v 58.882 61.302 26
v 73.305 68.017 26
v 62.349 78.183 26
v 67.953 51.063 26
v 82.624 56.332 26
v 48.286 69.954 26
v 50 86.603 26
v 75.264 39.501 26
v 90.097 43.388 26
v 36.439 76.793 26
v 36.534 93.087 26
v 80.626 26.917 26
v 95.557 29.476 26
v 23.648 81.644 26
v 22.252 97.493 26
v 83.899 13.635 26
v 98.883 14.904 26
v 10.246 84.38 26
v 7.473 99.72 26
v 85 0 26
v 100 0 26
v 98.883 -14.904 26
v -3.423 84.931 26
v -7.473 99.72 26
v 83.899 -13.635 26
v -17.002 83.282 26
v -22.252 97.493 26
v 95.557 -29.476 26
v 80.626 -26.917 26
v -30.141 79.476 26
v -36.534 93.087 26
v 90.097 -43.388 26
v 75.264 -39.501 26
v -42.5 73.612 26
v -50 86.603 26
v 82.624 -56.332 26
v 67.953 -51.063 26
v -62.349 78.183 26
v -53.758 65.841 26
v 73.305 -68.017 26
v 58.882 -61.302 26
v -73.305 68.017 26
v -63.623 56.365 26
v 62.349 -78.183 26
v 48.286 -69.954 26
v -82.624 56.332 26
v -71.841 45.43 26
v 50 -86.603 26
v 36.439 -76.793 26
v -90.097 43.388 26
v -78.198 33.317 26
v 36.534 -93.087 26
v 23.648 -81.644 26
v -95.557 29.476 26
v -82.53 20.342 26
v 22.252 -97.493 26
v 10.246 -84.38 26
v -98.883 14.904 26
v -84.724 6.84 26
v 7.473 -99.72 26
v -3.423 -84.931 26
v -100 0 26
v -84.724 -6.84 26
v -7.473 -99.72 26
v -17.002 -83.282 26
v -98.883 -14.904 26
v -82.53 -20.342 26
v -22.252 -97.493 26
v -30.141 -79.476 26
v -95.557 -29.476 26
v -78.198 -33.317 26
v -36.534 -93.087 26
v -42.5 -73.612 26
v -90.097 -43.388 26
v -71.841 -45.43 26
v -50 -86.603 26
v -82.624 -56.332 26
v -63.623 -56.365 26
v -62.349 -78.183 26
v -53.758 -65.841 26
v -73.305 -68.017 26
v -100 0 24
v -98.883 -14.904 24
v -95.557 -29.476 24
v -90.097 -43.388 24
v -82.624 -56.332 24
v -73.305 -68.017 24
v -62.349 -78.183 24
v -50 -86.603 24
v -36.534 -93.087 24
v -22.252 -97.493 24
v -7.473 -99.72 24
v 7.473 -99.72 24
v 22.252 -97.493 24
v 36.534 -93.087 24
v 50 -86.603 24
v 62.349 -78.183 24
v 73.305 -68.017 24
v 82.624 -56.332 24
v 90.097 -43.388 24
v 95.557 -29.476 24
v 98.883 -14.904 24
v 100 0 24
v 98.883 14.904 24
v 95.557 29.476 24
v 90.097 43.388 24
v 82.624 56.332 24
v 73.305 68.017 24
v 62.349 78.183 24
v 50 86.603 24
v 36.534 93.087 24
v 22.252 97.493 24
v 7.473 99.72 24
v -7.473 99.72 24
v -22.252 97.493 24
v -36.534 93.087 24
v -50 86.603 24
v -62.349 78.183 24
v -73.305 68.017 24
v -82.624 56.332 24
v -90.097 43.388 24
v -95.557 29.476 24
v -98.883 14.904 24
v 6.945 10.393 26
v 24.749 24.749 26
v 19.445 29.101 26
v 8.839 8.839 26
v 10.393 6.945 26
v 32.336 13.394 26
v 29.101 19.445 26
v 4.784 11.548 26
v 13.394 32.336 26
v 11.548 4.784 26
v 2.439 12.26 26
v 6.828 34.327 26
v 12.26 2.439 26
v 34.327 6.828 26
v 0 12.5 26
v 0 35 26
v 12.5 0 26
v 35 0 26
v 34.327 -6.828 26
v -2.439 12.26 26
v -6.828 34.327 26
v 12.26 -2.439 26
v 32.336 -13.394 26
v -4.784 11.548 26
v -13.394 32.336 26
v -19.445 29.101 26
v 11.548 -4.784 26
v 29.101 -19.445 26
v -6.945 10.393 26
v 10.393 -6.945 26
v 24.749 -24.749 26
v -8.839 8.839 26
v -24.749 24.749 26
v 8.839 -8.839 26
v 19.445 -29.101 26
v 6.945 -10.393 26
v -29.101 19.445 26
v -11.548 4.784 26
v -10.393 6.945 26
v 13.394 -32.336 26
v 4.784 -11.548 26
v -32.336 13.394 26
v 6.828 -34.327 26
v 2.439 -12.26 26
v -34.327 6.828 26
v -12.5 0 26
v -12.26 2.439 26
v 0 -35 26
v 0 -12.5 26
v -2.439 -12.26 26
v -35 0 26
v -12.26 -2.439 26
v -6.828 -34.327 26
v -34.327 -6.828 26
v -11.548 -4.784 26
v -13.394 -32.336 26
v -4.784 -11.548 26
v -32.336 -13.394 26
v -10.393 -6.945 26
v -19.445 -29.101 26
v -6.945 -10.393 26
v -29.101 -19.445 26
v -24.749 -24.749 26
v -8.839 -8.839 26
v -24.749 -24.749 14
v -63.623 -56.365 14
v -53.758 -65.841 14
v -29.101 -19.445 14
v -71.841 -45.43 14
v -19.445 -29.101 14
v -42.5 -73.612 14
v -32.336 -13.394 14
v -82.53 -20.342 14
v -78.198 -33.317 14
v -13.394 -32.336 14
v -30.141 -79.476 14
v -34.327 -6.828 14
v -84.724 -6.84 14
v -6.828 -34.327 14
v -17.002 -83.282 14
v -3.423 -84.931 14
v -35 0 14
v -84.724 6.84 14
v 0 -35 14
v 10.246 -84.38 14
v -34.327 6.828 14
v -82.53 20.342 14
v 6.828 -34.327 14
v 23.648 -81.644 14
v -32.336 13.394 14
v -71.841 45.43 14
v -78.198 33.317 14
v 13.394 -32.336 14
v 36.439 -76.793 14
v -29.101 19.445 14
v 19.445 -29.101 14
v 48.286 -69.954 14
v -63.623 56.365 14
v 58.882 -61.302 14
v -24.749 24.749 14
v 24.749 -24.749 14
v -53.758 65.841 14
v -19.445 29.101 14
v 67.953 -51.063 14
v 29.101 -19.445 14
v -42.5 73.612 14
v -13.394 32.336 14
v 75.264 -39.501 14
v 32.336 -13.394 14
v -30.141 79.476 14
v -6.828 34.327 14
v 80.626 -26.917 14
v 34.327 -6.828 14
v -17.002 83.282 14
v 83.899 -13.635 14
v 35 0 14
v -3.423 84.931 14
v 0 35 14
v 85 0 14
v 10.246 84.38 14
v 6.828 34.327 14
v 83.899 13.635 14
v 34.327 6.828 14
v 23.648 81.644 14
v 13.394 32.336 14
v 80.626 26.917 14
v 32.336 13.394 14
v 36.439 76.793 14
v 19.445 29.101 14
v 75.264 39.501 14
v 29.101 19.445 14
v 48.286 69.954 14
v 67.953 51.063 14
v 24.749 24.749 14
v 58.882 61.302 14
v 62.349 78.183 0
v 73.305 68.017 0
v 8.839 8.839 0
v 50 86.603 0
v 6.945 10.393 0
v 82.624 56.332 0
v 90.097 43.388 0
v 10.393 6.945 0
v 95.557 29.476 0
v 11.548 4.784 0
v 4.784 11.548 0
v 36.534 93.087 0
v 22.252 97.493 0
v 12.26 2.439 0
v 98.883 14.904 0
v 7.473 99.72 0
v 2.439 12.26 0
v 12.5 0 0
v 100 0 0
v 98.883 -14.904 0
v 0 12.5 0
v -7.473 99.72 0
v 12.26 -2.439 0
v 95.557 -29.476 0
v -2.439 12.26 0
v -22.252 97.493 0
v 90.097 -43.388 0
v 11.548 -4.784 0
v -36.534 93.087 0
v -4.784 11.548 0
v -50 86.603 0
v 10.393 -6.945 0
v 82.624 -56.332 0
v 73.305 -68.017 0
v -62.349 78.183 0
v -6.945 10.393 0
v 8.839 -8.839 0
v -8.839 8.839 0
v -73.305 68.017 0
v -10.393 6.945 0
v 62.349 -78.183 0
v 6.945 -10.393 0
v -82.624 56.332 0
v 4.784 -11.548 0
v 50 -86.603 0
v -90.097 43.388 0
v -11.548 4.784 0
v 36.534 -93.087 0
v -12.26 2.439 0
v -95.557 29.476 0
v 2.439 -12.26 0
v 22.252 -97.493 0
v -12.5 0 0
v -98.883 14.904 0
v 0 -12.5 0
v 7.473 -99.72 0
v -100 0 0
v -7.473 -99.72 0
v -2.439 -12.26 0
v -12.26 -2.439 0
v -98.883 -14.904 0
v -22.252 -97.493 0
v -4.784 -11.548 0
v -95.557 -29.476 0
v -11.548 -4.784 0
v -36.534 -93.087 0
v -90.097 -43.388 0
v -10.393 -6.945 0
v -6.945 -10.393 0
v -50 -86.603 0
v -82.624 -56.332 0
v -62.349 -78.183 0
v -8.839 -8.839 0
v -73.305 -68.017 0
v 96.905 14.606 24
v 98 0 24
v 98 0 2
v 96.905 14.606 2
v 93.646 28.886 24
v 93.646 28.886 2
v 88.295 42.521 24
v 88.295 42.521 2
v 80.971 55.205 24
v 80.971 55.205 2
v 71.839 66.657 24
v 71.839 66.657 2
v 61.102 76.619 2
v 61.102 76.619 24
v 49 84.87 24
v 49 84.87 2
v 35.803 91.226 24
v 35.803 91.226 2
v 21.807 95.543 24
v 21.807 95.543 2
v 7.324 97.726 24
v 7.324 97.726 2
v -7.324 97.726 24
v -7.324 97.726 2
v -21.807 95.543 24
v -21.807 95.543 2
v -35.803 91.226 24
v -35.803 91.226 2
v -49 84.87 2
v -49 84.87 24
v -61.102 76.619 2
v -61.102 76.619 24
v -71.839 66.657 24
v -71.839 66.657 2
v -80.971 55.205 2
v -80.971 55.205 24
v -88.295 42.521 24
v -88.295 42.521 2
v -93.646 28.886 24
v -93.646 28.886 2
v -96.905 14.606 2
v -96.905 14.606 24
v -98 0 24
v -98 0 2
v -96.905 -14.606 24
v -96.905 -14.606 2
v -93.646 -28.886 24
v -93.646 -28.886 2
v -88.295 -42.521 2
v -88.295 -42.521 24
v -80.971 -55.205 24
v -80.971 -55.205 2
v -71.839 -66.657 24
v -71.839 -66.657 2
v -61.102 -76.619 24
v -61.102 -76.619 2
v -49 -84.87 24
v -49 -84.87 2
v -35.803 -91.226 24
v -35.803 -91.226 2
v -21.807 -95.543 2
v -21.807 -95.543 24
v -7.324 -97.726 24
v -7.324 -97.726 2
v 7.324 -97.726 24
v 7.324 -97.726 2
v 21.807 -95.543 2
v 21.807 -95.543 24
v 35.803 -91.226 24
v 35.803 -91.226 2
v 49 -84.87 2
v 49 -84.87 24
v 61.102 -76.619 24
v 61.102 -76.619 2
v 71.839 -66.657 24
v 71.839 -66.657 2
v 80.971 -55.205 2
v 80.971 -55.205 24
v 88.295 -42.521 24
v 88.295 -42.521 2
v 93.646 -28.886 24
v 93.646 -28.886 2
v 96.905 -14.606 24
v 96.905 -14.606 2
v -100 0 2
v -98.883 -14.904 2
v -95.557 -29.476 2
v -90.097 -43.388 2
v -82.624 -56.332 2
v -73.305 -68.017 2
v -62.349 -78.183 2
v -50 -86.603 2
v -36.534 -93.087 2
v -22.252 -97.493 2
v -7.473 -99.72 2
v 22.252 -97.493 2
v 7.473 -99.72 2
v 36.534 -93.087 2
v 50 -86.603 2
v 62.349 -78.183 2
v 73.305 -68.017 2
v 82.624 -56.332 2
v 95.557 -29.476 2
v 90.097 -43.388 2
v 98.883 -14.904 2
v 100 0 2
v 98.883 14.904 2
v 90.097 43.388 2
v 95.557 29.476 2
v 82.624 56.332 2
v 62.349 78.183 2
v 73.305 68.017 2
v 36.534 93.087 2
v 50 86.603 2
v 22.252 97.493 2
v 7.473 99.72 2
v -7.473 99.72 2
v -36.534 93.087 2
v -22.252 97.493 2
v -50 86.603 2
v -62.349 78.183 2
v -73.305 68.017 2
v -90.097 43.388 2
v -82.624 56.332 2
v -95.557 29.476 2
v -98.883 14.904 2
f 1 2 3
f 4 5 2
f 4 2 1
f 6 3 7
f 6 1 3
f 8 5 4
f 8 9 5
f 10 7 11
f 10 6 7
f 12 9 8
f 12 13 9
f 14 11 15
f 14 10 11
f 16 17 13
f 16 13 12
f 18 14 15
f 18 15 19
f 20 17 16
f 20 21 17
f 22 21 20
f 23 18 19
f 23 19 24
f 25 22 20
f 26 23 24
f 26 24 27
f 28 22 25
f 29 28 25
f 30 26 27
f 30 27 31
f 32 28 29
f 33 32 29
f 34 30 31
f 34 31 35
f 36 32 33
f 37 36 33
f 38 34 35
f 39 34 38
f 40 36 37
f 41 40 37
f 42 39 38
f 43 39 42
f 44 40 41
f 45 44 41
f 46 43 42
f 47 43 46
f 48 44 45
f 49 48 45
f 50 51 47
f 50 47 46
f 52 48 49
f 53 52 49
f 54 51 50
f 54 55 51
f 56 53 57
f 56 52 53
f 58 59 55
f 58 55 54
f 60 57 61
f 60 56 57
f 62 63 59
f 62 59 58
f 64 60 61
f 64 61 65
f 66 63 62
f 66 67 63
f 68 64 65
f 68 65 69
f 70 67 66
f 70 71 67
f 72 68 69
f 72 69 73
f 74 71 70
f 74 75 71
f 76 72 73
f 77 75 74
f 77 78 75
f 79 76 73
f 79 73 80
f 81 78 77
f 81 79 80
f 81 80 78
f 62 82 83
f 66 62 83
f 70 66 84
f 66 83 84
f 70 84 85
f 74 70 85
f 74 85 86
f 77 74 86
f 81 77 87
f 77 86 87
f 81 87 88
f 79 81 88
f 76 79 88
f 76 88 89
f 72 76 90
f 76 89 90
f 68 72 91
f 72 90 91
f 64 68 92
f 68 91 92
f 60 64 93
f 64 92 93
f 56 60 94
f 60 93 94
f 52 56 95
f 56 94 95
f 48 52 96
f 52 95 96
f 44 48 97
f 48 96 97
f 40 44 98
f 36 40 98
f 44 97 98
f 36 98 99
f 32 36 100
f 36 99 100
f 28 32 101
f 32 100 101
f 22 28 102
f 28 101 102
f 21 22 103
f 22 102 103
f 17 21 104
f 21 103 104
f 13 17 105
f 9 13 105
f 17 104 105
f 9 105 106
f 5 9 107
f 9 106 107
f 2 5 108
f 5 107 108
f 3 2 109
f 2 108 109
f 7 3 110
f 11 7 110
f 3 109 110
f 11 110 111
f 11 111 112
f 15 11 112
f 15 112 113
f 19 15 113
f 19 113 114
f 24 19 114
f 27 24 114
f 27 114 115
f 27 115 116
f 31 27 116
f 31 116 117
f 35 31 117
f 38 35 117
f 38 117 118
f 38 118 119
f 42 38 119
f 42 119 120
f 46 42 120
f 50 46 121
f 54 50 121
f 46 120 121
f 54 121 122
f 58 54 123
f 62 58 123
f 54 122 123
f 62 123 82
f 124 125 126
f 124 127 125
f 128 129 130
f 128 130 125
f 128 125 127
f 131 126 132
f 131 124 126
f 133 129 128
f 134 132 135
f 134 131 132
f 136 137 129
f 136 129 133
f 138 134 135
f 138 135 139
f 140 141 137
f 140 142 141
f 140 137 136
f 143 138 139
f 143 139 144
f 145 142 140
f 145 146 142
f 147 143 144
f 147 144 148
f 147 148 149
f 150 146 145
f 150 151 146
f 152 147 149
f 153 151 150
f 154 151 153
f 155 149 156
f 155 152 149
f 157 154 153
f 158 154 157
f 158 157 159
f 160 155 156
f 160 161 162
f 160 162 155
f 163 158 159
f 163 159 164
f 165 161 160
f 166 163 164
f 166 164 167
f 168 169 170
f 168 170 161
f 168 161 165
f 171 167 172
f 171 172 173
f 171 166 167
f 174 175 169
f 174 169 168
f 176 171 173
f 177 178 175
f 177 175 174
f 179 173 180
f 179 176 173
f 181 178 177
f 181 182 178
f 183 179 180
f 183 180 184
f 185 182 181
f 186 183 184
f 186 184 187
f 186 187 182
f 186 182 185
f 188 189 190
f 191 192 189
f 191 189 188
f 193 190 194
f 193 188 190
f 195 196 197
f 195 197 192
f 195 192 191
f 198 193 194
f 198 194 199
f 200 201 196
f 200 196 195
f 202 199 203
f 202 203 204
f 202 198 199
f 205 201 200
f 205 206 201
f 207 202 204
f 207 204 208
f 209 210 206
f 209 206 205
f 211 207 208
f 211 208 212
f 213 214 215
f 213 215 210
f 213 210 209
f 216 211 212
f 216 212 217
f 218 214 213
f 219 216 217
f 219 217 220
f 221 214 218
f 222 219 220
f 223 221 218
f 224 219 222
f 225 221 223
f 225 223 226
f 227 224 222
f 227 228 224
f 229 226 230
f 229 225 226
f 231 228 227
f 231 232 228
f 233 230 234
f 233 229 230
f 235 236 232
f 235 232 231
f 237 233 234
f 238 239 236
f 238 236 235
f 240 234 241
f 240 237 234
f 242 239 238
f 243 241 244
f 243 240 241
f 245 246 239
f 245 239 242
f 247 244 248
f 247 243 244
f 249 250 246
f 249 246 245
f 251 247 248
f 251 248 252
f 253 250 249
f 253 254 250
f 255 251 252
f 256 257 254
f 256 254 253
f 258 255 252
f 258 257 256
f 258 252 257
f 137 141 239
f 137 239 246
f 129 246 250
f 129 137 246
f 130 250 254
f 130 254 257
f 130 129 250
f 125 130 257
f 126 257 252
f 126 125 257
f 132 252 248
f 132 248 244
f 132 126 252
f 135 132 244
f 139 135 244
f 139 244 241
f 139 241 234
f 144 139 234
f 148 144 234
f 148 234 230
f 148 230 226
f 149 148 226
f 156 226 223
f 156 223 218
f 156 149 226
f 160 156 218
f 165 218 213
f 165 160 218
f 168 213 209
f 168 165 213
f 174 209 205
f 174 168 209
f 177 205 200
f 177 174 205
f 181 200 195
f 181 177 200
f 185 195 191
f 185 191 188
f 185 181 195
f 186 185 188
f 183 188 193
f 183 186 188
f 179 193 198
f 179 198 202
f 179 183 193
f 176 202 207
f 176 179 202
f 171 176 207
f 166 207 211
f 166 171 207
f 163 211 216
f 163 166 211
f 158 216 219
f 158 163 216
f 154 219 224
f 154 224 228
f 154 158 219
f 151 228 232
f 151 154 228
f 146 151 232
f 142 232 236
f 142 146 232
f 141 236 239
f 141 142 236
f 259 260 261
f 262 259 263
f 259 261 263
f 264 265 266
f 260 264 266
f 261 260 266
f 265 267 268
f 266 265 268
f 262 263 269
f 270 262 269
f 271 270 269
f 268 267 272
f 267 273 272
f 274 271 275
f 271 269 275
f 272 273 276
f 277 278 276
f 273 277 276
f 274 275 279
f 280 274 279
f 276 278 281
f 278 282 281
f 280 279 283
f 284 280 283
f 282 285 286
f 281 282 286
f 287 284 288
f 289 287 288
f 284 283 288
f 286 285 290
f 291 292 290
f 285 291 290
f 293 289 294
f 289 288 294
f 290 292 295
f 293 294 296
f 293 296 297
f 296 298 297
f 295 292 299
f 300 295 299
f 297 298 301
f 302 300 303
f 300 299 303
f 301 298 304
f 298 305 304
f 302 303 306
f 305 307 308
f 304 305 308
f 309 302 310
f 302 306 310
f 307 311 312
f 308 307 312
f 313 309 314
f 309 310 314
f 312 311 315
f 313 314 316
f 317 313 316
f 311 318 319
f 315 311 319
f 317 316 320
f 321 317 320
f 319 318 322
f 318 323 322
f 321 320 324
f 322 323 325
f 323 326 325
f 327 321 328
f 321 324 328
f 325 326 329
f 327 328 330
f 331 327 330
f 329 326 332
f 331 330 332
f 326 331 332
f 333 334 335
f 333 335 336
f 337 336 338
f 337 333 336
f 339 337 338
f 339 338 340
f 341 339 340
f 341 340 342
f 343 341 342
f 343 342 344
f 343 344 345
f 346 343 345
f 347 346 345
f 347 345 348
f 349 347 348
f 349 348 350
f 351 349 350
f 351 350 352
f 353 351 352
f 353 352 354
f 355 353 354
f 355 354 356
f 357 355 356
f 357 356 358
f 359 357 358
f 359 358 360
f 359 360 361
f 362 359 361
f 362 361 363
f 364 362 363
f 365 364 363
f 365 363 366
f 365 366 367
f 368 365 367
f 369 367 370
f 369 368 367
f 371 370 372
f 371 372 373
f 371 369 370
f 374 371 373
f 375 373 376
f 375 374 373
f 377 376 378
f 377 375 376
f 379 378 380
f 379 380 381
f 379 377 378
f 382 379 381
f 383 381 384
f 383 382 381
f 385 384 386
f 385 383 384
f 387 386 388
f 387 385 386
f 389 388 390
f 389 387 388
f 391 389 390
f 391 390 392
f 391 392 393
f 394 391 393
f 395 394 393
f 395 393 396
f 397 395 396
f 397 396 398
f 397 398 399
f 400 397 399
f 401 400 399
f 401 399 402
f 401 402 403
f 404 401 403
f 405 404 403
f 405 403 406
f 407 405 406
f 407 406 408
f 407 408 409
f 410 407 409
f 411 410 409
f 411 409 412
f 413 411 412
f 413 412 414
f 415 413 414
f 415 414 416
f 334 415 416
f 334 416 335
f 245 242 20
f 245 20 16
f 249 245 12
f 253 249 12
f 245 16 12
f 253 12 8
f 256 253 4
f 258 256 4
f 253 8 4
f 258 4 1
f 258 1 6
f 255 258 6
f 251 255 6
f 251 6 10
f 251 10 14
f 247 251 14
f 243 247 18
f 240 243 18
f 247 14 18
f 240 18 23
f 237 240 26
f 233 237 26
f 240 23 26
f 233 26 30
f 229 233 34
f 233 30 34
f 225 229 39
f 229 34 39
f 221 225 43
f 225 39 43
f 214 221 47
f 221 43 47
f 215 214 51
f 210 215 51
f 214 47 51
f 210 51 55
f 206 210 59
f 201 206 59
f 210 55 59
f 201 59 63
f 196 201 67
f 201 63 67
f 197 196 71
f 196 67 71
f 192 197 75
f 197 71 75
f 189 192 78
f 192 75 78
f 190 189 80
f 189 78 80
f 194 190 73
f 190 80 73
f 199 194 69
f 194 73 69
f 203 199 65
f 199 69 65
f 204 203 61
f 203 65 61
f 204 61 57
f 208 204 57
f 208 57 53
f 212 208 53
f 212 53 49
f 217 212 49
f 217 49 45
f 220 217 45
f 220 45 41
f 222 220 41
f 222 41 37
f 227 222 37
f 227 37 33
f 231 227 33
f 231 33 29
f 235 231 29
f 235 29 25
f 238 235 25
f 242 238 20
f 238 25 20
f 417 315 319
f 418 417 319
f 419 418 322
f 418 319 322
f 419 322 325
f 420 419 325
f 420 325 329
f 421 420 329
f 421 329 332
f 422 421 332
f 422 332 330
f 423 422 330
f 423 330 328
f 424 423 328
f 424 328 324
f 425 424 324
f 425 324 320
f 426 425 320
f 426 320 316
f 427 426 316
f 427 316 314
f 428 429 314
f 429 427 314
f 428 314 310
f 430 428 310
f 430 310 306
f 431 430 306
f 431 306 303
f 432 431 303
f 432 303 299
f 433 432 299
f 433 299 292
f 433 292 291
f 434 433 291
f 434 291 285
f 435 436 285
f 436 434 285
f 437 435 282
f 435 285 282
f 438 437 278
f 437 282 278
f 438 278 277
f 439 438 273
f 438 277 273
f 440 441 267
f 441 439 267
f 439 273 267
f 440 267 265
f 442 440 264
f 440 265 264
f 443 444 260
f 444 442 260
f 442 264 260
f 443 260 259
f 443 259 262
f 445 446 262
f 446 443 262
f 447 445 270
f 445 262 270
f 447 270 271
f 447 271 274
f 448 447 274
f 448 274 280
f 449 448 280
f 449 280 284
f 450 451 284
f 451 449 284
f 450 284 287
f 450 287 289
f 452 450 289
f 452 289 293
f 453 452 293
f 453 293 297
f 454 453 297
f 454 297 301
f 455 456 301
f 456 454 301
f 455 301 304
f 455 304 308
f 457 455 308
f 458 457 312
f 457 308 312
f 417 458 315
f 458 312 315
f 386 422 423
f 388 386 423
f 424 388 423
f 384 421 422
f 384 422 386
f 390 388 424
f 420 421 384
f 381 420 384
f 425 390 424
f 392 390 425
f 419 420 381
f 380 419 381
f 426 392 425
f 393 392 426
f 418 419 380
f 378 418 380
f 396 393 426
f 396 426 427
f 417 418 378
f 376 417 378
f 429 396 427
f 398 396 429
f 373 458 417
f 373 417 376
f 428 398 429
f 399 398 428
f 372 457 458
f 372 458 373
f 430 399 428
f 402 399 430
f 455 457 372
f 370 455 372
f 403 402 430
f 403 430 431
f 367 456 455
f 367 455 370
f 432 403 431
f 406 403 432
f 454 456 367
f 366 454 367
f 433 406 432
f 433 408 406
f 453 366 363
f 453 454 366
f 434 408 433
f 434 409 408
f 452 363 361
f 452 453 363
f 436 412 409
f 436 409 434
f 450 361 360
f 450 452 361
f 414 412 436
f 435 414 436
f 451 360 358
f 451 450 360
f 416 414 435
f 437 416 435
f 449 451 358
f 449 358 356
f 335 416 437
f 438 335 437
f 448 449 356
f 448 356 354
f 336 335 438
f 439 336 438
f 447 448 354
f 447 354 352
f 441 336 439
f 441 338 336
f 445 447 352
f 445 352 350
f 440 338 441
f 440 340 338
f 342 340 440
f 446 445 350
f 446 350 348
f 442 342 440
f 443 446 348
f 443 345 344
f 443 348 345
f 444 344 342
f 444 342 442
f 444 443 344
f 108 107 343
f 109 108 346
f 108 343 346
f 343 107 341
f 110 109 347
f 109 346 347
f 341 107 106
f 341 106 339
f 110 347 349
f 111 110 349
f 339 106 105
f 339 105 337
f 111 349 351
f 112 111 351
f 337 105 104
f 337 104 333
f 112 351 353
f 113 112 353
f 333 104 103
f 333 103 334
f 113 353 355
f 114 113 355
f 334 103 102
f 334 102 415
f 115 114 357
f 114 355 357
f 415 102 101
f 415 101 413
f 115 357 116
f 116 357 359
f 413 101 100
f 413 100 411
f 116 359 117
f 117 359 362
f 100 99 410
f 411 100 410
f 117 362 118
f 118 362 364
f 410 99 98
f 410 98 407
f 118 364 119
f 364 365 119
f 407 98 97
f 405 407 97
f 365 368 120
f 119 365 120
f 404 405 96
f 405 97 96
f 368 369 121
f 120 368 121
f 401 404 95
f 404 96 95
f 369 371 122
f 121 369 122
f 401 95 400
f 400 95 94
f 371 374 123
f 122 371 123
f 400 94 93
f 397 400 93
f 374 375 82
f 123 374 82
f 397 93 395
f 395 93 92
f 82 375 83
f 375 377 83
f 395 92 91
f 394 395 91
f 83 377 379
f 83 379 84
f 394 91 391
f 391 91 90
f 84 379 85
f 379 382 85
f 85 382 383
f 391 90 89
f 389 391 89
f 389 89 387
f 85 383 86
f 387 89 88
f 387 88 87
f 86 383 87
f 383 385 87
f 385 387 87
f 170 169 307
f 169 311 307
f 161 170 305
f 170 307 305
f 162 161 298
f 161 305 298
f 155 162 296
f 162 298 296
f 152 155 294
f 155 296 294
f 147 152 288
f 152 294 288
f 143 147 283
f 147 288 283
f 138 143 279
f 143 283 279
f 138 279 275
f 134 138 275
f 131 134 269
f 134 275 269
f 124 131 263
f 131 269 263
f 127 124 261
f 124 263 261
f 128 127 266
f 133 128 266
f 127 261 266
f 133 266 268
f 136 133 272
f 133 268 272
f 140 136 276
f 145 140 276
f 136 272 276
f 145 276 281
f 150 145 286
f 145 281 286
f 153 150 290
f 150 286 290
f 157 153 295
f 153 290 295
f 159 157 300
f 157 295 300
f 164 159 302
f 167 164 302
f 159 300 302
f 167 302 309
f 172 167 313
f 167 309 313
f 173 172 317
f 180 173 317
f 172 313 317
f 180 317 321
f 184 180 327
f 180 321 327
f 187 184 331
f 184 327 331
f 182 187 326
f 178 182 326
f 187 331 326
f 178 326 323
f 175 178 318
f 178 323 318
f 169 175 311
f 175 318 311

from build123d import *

# Parameters (mm, degrees)
SKETCH1_R           = 100
SKETCH1_R_2         = 12.5
BOSS_EXTRUDE1_DEPTH = 26
SKETCH3_OUTSIDE_W   = 258.808
SKETCH3_OUTSIDE_H   = 258.808
SKETCH3_OUTSIDE_R   = 98
CUT_EXTRUDE3_DEPTH  = 24
BOSS_EXTRUDE3_START = -2
SKETCH6_R           = 100
BOSS_EXTRUDE3_DEPTH = 2
SKETCH7_R           = 12.5
CUT_EXTRUDE6_DEPTH  = 144.791515744
SKETCH8_R           = 85
SKETCH8_R_2         = 35
CUT_EXTRUDE7_DEPTH  = 12


with BuildPart() as part:
    # Sketch1 → Boss-Extrude1 (new body)
    with BuildSketch(Plane.XY):
        with Locations(Location((0, 0, 0), (0, 0, 180))):
            Circle(SKETCH1_R)
        with Locations(Location((0, 0, 0), (0, 0, 180))):
            Circle(SKETCH1_R_2, mode=Mode.SUBTRACT)
    extrude(amount=BOSS_EXTRUDE1_DEPTH)

    # Sketch3 outside → Cut-Extrude3 (cut)
    with BuildSketch(Plane.XY.offset(26)):
        Rectangle(SKETCH3_OUTSIDE_W, SKETCH3_OUTSIDE_H)
        Circle(SKETCH3_OUTSIDE_R, mode=Mode.SUBTRACT)
    extrude(amount=-CUT_EXTRUDE3_DEPTH, mode=Mode.SUBTRACT)

    # Sketch6 → Boss-Extrude3 (add)
    with BuildSketch(Plane.XY.offset(26).offset(BOSS_EXTRUDE3_START)):
        with Locations(Location((0, 0, 0), (0, 0, 180))):
            Circle(SKETCH6_R)
    extrude(amount=BOSS_EXTRUDE3_DEPTH)

    # Sketch7 → Cut-Extrude6 (cut, through all)
    with BuildSketch(Plane(origin=(0, 0, 0), x_dir=(-1, 0, 0), z_dir=(0, 0, -1))):
        Circle(SKETCH7_R)
    extrude(amount=-CUT_EXTRUDE6_DEPTH, mode=Mode.SUBTRACT)

    # Sketch8 → Cut-Extrude7 (cut)
    with BuildSketch(Plane.XY.offset(26)):
        Circle(SKETCH8_R)
        Circle(SKETCH8_R_2, mode=Mode.SUBTRACT)
    extrude(amount=-CUT_EXTRUDE7_DEPTH, mode=Mode.SUBTRACT)


solid = part.part
